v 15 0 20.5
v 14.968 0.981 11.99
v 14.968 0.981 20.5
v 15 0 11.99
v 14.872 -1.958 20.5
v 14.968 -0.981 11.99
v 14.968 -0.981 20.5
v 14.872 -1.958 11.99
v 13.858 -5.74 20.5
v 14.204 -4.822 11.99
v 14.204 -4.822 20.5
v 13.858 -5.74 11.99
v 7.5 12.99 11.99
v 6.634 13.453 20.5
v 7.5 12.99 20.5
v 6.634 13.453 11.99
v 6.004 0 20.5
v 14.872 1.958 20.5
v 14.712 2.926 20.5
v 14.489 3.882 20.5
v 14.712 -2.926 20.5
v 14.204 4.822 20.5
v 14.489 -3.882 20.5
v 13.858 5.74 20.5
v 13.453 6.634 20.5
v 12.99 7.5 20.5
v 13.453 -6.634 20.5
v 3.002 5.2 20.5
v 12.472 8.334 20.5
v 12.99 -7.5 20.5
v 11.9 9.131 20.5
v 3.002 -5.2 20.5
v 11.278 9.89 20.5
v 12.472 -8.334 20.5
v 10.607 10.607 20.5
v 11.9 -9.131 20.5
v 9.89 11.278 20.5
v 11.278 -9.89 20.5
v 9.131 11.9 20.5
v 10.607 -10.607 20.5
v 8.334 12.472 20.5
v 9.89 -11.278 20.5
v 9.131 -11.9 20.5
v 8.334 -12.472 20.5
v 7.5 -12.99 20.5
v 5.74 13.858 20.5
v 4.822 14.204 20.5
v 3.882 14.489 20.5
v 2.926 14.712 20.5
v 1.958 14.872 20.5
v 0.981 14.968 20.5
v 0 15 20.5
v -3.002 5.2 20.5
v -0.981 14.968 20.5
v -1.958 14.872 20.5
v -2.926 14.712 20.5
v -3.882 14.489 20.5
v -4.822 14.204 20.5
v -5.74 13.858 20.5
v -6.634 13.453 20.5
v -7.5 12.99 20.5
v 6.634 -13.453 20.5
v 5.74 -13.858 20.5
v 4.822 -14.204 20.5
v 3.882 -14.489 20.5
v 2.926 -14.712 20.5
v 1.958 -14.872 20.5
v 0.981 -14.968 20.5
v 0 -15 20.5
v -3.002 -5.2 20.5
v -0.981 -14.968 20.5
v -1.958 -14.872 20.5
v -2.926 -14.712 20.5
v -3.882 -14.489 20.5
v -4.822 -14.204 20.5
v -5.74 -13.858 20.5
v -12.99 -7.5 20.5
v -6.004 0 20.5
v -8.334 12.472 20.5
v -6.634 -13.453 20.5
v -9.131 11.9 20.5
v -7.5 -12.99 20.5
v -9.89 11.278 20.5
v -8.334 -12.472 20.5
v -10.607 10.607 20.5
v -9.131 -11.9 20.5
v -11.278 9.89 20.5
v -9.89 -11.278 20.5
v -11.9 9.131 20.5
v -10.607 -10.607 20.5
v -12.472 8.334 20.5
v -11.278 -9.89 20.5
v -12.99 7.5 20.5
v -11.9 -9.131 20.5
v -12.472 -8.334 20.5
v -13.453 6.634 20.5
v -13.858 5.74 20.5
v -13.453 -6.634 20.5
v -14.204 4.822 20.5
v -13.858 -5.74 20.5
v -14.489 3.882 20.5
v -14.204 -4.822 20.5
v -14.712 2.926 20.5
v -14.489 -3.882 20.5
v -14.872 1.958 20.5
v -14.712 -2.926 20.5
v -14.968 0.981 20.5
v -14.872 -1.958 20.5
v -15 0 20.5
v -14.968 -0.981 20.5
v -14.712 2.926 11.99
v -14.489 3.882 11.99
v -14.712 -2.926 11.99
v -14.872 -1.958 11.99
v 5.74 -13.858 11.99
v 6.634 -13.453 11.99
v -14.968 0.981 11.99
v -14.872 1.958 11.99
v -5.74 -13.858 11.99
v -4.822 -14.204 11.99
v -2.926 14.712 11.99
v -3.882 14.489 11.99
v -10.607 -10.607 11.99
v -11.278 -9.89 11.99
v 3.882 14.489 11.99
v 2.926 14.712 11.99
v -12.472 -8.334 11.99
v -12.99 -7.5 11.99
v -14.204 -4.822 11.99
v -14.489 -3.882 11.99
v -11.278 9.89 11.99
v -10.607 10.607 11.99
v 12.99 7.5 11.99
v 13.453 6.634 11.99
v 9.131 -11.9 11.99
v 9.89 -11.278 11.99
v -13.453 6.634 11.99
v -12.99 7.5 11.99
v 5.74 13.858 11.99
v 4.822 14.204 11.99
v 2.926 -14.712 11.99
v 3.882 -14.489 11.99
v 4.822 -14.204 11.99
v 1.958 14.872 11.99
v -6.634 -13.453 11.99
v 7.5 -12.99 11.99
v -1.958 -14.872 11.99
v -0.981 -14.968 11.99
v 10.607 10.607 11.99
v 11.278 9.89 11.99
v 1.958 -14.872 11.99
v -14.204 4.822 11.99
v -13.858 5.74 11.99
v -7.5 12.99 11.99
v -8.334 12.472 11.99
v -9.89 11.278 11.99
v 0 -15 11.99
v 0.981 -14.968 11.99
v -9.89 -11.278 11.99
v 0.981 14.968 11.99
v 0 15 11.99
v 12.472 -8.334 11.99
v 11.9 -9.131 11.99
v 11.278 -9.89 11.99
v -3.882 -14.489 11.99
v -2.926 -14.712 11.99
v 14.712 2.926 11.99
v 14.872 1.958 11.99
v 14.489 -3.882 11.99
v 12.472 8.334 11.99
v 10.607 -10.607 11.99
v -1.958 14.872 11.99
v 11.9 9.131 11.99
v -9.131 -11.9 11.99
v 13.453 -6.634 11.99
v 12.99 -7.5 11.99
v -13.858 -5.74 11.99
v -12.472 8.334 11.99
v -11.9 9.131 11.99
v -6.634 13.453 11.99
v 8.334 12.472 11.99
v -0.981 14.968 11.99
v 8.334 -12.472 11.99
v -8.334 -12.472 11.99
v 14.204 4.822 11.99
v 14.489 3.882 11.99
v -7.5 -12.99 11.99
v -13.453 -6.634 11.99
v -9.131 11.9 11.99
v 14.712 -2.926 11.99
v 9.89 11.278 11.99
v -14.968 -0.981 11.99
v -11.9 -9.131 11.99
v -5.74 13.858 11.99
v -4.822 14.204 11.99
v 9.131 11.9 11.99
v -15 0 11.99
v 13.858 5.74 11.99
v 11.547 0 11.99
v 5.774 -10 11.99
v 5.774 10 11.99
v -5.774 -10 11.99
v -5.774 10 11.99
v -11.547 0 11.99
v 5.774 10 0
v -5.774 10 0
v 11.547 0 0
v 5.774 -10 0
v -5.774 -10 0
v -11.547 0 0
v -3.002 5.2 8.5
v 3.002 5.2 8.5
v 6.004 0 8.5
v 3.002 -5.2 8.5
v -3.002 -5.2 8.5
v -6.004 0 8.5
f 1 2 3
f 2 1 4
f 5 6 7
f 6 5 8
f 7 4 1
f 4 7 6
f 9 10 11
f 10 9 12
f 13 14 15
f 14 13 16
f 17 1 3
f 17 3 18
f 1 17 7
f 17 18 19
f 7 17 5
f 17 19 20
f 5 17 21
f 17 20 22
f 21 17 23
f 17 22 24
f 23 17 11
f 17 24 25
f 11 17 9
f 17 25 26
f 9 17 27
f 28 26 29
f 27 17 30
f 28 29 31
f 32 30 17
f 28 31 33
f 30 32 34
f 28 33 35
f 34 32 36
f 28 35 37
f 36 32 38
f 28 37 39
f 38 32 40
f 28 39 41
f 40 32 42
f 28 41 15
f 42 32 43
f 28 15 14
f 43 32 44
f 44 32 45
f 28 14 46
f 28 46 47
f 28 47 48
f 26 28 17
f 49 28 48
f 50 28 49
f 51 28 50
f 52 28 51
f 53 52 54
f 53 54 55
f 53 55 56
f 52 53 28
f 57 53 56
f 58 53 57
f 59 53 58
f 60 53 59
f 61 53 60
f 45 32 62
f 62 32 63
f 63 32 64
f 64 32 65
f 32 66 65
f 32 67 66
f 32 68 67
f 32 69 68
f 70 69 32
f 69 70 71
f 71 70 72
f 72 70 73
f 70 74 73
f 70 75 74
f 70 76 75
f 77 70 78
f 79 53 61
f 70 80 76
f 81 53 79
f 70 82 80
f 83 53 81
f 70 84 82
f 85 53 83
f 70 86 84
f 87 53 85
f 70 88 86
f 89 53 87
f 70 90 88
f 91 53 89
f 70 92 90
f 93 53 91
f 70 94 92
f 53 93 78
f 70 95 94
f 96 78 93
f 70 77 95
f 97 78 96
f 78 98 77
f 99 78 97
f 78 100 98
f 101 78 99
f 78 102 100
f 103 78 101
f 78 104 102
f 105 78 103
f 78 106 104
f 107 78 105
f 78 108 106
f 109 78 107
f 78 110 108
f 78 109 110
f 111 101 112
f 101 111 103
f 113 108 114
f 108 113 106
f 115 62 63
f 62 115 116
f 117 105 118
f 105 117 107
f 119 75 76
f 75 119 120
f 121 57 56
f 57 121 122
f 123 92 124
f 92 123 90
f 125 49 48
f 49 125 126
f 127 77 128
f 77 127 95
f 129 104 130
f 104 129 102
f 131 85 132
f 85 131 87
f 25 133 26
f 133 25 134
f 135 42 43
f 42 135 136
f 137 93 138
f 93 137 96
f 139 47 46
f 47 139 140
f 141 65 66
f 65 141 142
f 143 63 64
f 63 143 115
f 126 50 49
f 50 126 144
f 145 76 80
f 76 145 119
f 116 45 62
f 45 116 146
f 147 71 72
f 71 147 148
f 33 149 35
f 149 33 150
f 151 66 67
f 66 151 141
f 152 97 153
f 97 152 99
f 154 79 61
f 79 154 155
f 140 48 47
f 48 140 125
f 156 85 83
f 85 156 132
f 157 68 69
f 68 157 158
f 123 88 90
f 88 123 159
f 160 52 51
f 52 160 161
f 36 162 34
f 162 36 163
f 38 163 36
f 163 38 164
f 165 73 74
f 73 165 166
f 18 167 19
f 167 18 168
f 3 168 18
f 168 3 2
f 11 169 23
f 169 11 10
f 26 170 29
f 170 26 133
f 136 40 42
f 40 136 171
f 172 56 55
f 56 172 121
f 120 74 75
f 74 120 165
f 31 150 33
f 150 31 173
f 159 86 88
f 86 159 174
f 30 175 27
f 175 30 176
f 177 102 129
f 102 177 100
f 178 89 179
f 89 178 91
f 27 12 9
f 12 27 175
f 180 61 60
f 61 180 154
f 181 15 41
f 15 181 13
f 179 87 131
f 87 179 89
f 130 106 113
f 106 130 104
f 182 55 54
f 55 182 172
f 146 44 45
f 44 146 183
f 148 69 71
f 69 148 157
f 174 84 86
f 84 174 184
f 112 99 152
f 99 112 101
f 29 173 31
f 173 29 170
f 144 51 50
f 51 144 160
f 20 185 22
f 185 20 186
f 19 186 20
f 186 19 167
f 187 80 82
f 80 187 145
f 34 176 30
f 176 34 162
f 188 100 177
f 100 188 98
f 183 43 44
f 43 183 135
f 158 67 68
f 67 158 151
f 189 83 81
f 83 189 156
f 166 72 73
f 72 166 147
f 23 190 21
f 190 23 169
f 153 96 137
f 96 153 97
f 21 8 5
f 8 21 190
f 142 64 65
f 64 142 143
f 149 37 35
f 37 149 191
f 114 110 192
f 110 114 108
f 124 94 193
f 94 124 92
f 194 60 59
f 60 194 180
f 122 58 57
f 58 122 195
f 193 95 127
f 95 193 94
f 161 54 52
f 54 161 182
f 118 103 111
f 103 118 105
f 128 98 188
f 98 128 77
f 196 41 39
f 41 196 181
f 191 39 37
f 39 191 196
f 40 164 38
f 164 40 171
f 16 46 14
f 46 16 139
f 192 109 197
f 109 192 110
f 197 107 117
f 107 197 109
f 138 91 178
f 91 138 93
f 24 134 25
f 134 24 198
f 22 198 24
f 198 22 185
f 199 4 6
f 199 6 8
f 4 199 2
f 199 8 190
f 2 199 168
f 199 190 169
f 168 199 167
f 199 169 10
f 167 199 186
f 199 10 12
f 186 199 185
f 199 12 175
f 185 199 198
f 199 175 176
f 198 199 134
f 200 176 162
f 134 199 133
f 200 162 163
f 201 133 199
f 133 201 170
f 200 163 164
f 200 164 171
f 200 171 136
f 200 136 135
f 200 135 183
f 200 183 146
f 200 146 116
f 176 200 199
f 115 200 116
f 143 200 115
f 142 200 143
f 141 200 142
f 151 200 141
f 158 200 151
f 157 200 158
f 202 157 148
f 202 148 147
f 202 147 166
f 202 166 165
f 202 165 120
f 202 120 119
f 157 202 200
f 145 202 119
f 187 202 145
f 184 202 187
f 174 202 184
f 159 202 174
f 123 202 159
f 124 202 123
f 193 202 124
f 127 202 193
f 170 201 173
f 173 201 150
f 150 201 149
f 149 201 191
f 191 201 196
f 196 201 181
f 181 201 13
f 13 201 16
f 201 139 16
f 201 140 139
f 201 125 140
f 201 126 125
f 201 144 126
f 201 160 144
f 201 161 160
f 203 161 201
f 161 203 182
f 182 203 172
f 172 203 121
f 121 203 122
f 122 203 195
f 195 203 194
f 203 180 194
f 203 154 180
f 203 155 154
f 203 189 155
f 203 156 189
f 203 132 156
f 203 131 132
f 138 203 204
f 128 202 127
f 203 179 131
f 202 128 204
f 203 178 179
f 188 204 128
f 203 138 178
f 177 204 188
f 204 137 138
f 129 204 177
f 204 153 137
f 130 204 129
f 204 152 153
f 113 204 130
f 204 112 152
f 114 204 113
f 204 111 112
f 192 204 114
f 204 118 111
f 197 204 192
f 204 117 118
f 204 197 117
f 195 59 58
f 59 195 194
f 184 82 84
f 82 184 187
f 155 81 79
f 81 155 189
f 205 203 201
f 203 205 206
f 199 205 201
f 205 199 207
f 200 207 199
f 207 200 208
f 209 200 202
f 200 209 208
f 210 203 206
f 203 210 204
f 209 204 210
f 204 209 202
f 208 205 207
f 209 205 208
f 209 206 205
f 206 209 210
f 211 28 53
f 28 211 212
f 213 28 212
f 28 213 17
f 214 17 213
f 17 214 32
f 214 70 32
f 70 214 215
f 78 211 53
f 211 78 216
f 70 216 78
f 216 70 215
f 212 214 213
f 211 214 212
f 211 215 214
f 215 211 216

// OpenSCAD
include <../lib/meshtastic-drybag-node-lib.scad>;
$fn = 40;
reel_hub_print();
